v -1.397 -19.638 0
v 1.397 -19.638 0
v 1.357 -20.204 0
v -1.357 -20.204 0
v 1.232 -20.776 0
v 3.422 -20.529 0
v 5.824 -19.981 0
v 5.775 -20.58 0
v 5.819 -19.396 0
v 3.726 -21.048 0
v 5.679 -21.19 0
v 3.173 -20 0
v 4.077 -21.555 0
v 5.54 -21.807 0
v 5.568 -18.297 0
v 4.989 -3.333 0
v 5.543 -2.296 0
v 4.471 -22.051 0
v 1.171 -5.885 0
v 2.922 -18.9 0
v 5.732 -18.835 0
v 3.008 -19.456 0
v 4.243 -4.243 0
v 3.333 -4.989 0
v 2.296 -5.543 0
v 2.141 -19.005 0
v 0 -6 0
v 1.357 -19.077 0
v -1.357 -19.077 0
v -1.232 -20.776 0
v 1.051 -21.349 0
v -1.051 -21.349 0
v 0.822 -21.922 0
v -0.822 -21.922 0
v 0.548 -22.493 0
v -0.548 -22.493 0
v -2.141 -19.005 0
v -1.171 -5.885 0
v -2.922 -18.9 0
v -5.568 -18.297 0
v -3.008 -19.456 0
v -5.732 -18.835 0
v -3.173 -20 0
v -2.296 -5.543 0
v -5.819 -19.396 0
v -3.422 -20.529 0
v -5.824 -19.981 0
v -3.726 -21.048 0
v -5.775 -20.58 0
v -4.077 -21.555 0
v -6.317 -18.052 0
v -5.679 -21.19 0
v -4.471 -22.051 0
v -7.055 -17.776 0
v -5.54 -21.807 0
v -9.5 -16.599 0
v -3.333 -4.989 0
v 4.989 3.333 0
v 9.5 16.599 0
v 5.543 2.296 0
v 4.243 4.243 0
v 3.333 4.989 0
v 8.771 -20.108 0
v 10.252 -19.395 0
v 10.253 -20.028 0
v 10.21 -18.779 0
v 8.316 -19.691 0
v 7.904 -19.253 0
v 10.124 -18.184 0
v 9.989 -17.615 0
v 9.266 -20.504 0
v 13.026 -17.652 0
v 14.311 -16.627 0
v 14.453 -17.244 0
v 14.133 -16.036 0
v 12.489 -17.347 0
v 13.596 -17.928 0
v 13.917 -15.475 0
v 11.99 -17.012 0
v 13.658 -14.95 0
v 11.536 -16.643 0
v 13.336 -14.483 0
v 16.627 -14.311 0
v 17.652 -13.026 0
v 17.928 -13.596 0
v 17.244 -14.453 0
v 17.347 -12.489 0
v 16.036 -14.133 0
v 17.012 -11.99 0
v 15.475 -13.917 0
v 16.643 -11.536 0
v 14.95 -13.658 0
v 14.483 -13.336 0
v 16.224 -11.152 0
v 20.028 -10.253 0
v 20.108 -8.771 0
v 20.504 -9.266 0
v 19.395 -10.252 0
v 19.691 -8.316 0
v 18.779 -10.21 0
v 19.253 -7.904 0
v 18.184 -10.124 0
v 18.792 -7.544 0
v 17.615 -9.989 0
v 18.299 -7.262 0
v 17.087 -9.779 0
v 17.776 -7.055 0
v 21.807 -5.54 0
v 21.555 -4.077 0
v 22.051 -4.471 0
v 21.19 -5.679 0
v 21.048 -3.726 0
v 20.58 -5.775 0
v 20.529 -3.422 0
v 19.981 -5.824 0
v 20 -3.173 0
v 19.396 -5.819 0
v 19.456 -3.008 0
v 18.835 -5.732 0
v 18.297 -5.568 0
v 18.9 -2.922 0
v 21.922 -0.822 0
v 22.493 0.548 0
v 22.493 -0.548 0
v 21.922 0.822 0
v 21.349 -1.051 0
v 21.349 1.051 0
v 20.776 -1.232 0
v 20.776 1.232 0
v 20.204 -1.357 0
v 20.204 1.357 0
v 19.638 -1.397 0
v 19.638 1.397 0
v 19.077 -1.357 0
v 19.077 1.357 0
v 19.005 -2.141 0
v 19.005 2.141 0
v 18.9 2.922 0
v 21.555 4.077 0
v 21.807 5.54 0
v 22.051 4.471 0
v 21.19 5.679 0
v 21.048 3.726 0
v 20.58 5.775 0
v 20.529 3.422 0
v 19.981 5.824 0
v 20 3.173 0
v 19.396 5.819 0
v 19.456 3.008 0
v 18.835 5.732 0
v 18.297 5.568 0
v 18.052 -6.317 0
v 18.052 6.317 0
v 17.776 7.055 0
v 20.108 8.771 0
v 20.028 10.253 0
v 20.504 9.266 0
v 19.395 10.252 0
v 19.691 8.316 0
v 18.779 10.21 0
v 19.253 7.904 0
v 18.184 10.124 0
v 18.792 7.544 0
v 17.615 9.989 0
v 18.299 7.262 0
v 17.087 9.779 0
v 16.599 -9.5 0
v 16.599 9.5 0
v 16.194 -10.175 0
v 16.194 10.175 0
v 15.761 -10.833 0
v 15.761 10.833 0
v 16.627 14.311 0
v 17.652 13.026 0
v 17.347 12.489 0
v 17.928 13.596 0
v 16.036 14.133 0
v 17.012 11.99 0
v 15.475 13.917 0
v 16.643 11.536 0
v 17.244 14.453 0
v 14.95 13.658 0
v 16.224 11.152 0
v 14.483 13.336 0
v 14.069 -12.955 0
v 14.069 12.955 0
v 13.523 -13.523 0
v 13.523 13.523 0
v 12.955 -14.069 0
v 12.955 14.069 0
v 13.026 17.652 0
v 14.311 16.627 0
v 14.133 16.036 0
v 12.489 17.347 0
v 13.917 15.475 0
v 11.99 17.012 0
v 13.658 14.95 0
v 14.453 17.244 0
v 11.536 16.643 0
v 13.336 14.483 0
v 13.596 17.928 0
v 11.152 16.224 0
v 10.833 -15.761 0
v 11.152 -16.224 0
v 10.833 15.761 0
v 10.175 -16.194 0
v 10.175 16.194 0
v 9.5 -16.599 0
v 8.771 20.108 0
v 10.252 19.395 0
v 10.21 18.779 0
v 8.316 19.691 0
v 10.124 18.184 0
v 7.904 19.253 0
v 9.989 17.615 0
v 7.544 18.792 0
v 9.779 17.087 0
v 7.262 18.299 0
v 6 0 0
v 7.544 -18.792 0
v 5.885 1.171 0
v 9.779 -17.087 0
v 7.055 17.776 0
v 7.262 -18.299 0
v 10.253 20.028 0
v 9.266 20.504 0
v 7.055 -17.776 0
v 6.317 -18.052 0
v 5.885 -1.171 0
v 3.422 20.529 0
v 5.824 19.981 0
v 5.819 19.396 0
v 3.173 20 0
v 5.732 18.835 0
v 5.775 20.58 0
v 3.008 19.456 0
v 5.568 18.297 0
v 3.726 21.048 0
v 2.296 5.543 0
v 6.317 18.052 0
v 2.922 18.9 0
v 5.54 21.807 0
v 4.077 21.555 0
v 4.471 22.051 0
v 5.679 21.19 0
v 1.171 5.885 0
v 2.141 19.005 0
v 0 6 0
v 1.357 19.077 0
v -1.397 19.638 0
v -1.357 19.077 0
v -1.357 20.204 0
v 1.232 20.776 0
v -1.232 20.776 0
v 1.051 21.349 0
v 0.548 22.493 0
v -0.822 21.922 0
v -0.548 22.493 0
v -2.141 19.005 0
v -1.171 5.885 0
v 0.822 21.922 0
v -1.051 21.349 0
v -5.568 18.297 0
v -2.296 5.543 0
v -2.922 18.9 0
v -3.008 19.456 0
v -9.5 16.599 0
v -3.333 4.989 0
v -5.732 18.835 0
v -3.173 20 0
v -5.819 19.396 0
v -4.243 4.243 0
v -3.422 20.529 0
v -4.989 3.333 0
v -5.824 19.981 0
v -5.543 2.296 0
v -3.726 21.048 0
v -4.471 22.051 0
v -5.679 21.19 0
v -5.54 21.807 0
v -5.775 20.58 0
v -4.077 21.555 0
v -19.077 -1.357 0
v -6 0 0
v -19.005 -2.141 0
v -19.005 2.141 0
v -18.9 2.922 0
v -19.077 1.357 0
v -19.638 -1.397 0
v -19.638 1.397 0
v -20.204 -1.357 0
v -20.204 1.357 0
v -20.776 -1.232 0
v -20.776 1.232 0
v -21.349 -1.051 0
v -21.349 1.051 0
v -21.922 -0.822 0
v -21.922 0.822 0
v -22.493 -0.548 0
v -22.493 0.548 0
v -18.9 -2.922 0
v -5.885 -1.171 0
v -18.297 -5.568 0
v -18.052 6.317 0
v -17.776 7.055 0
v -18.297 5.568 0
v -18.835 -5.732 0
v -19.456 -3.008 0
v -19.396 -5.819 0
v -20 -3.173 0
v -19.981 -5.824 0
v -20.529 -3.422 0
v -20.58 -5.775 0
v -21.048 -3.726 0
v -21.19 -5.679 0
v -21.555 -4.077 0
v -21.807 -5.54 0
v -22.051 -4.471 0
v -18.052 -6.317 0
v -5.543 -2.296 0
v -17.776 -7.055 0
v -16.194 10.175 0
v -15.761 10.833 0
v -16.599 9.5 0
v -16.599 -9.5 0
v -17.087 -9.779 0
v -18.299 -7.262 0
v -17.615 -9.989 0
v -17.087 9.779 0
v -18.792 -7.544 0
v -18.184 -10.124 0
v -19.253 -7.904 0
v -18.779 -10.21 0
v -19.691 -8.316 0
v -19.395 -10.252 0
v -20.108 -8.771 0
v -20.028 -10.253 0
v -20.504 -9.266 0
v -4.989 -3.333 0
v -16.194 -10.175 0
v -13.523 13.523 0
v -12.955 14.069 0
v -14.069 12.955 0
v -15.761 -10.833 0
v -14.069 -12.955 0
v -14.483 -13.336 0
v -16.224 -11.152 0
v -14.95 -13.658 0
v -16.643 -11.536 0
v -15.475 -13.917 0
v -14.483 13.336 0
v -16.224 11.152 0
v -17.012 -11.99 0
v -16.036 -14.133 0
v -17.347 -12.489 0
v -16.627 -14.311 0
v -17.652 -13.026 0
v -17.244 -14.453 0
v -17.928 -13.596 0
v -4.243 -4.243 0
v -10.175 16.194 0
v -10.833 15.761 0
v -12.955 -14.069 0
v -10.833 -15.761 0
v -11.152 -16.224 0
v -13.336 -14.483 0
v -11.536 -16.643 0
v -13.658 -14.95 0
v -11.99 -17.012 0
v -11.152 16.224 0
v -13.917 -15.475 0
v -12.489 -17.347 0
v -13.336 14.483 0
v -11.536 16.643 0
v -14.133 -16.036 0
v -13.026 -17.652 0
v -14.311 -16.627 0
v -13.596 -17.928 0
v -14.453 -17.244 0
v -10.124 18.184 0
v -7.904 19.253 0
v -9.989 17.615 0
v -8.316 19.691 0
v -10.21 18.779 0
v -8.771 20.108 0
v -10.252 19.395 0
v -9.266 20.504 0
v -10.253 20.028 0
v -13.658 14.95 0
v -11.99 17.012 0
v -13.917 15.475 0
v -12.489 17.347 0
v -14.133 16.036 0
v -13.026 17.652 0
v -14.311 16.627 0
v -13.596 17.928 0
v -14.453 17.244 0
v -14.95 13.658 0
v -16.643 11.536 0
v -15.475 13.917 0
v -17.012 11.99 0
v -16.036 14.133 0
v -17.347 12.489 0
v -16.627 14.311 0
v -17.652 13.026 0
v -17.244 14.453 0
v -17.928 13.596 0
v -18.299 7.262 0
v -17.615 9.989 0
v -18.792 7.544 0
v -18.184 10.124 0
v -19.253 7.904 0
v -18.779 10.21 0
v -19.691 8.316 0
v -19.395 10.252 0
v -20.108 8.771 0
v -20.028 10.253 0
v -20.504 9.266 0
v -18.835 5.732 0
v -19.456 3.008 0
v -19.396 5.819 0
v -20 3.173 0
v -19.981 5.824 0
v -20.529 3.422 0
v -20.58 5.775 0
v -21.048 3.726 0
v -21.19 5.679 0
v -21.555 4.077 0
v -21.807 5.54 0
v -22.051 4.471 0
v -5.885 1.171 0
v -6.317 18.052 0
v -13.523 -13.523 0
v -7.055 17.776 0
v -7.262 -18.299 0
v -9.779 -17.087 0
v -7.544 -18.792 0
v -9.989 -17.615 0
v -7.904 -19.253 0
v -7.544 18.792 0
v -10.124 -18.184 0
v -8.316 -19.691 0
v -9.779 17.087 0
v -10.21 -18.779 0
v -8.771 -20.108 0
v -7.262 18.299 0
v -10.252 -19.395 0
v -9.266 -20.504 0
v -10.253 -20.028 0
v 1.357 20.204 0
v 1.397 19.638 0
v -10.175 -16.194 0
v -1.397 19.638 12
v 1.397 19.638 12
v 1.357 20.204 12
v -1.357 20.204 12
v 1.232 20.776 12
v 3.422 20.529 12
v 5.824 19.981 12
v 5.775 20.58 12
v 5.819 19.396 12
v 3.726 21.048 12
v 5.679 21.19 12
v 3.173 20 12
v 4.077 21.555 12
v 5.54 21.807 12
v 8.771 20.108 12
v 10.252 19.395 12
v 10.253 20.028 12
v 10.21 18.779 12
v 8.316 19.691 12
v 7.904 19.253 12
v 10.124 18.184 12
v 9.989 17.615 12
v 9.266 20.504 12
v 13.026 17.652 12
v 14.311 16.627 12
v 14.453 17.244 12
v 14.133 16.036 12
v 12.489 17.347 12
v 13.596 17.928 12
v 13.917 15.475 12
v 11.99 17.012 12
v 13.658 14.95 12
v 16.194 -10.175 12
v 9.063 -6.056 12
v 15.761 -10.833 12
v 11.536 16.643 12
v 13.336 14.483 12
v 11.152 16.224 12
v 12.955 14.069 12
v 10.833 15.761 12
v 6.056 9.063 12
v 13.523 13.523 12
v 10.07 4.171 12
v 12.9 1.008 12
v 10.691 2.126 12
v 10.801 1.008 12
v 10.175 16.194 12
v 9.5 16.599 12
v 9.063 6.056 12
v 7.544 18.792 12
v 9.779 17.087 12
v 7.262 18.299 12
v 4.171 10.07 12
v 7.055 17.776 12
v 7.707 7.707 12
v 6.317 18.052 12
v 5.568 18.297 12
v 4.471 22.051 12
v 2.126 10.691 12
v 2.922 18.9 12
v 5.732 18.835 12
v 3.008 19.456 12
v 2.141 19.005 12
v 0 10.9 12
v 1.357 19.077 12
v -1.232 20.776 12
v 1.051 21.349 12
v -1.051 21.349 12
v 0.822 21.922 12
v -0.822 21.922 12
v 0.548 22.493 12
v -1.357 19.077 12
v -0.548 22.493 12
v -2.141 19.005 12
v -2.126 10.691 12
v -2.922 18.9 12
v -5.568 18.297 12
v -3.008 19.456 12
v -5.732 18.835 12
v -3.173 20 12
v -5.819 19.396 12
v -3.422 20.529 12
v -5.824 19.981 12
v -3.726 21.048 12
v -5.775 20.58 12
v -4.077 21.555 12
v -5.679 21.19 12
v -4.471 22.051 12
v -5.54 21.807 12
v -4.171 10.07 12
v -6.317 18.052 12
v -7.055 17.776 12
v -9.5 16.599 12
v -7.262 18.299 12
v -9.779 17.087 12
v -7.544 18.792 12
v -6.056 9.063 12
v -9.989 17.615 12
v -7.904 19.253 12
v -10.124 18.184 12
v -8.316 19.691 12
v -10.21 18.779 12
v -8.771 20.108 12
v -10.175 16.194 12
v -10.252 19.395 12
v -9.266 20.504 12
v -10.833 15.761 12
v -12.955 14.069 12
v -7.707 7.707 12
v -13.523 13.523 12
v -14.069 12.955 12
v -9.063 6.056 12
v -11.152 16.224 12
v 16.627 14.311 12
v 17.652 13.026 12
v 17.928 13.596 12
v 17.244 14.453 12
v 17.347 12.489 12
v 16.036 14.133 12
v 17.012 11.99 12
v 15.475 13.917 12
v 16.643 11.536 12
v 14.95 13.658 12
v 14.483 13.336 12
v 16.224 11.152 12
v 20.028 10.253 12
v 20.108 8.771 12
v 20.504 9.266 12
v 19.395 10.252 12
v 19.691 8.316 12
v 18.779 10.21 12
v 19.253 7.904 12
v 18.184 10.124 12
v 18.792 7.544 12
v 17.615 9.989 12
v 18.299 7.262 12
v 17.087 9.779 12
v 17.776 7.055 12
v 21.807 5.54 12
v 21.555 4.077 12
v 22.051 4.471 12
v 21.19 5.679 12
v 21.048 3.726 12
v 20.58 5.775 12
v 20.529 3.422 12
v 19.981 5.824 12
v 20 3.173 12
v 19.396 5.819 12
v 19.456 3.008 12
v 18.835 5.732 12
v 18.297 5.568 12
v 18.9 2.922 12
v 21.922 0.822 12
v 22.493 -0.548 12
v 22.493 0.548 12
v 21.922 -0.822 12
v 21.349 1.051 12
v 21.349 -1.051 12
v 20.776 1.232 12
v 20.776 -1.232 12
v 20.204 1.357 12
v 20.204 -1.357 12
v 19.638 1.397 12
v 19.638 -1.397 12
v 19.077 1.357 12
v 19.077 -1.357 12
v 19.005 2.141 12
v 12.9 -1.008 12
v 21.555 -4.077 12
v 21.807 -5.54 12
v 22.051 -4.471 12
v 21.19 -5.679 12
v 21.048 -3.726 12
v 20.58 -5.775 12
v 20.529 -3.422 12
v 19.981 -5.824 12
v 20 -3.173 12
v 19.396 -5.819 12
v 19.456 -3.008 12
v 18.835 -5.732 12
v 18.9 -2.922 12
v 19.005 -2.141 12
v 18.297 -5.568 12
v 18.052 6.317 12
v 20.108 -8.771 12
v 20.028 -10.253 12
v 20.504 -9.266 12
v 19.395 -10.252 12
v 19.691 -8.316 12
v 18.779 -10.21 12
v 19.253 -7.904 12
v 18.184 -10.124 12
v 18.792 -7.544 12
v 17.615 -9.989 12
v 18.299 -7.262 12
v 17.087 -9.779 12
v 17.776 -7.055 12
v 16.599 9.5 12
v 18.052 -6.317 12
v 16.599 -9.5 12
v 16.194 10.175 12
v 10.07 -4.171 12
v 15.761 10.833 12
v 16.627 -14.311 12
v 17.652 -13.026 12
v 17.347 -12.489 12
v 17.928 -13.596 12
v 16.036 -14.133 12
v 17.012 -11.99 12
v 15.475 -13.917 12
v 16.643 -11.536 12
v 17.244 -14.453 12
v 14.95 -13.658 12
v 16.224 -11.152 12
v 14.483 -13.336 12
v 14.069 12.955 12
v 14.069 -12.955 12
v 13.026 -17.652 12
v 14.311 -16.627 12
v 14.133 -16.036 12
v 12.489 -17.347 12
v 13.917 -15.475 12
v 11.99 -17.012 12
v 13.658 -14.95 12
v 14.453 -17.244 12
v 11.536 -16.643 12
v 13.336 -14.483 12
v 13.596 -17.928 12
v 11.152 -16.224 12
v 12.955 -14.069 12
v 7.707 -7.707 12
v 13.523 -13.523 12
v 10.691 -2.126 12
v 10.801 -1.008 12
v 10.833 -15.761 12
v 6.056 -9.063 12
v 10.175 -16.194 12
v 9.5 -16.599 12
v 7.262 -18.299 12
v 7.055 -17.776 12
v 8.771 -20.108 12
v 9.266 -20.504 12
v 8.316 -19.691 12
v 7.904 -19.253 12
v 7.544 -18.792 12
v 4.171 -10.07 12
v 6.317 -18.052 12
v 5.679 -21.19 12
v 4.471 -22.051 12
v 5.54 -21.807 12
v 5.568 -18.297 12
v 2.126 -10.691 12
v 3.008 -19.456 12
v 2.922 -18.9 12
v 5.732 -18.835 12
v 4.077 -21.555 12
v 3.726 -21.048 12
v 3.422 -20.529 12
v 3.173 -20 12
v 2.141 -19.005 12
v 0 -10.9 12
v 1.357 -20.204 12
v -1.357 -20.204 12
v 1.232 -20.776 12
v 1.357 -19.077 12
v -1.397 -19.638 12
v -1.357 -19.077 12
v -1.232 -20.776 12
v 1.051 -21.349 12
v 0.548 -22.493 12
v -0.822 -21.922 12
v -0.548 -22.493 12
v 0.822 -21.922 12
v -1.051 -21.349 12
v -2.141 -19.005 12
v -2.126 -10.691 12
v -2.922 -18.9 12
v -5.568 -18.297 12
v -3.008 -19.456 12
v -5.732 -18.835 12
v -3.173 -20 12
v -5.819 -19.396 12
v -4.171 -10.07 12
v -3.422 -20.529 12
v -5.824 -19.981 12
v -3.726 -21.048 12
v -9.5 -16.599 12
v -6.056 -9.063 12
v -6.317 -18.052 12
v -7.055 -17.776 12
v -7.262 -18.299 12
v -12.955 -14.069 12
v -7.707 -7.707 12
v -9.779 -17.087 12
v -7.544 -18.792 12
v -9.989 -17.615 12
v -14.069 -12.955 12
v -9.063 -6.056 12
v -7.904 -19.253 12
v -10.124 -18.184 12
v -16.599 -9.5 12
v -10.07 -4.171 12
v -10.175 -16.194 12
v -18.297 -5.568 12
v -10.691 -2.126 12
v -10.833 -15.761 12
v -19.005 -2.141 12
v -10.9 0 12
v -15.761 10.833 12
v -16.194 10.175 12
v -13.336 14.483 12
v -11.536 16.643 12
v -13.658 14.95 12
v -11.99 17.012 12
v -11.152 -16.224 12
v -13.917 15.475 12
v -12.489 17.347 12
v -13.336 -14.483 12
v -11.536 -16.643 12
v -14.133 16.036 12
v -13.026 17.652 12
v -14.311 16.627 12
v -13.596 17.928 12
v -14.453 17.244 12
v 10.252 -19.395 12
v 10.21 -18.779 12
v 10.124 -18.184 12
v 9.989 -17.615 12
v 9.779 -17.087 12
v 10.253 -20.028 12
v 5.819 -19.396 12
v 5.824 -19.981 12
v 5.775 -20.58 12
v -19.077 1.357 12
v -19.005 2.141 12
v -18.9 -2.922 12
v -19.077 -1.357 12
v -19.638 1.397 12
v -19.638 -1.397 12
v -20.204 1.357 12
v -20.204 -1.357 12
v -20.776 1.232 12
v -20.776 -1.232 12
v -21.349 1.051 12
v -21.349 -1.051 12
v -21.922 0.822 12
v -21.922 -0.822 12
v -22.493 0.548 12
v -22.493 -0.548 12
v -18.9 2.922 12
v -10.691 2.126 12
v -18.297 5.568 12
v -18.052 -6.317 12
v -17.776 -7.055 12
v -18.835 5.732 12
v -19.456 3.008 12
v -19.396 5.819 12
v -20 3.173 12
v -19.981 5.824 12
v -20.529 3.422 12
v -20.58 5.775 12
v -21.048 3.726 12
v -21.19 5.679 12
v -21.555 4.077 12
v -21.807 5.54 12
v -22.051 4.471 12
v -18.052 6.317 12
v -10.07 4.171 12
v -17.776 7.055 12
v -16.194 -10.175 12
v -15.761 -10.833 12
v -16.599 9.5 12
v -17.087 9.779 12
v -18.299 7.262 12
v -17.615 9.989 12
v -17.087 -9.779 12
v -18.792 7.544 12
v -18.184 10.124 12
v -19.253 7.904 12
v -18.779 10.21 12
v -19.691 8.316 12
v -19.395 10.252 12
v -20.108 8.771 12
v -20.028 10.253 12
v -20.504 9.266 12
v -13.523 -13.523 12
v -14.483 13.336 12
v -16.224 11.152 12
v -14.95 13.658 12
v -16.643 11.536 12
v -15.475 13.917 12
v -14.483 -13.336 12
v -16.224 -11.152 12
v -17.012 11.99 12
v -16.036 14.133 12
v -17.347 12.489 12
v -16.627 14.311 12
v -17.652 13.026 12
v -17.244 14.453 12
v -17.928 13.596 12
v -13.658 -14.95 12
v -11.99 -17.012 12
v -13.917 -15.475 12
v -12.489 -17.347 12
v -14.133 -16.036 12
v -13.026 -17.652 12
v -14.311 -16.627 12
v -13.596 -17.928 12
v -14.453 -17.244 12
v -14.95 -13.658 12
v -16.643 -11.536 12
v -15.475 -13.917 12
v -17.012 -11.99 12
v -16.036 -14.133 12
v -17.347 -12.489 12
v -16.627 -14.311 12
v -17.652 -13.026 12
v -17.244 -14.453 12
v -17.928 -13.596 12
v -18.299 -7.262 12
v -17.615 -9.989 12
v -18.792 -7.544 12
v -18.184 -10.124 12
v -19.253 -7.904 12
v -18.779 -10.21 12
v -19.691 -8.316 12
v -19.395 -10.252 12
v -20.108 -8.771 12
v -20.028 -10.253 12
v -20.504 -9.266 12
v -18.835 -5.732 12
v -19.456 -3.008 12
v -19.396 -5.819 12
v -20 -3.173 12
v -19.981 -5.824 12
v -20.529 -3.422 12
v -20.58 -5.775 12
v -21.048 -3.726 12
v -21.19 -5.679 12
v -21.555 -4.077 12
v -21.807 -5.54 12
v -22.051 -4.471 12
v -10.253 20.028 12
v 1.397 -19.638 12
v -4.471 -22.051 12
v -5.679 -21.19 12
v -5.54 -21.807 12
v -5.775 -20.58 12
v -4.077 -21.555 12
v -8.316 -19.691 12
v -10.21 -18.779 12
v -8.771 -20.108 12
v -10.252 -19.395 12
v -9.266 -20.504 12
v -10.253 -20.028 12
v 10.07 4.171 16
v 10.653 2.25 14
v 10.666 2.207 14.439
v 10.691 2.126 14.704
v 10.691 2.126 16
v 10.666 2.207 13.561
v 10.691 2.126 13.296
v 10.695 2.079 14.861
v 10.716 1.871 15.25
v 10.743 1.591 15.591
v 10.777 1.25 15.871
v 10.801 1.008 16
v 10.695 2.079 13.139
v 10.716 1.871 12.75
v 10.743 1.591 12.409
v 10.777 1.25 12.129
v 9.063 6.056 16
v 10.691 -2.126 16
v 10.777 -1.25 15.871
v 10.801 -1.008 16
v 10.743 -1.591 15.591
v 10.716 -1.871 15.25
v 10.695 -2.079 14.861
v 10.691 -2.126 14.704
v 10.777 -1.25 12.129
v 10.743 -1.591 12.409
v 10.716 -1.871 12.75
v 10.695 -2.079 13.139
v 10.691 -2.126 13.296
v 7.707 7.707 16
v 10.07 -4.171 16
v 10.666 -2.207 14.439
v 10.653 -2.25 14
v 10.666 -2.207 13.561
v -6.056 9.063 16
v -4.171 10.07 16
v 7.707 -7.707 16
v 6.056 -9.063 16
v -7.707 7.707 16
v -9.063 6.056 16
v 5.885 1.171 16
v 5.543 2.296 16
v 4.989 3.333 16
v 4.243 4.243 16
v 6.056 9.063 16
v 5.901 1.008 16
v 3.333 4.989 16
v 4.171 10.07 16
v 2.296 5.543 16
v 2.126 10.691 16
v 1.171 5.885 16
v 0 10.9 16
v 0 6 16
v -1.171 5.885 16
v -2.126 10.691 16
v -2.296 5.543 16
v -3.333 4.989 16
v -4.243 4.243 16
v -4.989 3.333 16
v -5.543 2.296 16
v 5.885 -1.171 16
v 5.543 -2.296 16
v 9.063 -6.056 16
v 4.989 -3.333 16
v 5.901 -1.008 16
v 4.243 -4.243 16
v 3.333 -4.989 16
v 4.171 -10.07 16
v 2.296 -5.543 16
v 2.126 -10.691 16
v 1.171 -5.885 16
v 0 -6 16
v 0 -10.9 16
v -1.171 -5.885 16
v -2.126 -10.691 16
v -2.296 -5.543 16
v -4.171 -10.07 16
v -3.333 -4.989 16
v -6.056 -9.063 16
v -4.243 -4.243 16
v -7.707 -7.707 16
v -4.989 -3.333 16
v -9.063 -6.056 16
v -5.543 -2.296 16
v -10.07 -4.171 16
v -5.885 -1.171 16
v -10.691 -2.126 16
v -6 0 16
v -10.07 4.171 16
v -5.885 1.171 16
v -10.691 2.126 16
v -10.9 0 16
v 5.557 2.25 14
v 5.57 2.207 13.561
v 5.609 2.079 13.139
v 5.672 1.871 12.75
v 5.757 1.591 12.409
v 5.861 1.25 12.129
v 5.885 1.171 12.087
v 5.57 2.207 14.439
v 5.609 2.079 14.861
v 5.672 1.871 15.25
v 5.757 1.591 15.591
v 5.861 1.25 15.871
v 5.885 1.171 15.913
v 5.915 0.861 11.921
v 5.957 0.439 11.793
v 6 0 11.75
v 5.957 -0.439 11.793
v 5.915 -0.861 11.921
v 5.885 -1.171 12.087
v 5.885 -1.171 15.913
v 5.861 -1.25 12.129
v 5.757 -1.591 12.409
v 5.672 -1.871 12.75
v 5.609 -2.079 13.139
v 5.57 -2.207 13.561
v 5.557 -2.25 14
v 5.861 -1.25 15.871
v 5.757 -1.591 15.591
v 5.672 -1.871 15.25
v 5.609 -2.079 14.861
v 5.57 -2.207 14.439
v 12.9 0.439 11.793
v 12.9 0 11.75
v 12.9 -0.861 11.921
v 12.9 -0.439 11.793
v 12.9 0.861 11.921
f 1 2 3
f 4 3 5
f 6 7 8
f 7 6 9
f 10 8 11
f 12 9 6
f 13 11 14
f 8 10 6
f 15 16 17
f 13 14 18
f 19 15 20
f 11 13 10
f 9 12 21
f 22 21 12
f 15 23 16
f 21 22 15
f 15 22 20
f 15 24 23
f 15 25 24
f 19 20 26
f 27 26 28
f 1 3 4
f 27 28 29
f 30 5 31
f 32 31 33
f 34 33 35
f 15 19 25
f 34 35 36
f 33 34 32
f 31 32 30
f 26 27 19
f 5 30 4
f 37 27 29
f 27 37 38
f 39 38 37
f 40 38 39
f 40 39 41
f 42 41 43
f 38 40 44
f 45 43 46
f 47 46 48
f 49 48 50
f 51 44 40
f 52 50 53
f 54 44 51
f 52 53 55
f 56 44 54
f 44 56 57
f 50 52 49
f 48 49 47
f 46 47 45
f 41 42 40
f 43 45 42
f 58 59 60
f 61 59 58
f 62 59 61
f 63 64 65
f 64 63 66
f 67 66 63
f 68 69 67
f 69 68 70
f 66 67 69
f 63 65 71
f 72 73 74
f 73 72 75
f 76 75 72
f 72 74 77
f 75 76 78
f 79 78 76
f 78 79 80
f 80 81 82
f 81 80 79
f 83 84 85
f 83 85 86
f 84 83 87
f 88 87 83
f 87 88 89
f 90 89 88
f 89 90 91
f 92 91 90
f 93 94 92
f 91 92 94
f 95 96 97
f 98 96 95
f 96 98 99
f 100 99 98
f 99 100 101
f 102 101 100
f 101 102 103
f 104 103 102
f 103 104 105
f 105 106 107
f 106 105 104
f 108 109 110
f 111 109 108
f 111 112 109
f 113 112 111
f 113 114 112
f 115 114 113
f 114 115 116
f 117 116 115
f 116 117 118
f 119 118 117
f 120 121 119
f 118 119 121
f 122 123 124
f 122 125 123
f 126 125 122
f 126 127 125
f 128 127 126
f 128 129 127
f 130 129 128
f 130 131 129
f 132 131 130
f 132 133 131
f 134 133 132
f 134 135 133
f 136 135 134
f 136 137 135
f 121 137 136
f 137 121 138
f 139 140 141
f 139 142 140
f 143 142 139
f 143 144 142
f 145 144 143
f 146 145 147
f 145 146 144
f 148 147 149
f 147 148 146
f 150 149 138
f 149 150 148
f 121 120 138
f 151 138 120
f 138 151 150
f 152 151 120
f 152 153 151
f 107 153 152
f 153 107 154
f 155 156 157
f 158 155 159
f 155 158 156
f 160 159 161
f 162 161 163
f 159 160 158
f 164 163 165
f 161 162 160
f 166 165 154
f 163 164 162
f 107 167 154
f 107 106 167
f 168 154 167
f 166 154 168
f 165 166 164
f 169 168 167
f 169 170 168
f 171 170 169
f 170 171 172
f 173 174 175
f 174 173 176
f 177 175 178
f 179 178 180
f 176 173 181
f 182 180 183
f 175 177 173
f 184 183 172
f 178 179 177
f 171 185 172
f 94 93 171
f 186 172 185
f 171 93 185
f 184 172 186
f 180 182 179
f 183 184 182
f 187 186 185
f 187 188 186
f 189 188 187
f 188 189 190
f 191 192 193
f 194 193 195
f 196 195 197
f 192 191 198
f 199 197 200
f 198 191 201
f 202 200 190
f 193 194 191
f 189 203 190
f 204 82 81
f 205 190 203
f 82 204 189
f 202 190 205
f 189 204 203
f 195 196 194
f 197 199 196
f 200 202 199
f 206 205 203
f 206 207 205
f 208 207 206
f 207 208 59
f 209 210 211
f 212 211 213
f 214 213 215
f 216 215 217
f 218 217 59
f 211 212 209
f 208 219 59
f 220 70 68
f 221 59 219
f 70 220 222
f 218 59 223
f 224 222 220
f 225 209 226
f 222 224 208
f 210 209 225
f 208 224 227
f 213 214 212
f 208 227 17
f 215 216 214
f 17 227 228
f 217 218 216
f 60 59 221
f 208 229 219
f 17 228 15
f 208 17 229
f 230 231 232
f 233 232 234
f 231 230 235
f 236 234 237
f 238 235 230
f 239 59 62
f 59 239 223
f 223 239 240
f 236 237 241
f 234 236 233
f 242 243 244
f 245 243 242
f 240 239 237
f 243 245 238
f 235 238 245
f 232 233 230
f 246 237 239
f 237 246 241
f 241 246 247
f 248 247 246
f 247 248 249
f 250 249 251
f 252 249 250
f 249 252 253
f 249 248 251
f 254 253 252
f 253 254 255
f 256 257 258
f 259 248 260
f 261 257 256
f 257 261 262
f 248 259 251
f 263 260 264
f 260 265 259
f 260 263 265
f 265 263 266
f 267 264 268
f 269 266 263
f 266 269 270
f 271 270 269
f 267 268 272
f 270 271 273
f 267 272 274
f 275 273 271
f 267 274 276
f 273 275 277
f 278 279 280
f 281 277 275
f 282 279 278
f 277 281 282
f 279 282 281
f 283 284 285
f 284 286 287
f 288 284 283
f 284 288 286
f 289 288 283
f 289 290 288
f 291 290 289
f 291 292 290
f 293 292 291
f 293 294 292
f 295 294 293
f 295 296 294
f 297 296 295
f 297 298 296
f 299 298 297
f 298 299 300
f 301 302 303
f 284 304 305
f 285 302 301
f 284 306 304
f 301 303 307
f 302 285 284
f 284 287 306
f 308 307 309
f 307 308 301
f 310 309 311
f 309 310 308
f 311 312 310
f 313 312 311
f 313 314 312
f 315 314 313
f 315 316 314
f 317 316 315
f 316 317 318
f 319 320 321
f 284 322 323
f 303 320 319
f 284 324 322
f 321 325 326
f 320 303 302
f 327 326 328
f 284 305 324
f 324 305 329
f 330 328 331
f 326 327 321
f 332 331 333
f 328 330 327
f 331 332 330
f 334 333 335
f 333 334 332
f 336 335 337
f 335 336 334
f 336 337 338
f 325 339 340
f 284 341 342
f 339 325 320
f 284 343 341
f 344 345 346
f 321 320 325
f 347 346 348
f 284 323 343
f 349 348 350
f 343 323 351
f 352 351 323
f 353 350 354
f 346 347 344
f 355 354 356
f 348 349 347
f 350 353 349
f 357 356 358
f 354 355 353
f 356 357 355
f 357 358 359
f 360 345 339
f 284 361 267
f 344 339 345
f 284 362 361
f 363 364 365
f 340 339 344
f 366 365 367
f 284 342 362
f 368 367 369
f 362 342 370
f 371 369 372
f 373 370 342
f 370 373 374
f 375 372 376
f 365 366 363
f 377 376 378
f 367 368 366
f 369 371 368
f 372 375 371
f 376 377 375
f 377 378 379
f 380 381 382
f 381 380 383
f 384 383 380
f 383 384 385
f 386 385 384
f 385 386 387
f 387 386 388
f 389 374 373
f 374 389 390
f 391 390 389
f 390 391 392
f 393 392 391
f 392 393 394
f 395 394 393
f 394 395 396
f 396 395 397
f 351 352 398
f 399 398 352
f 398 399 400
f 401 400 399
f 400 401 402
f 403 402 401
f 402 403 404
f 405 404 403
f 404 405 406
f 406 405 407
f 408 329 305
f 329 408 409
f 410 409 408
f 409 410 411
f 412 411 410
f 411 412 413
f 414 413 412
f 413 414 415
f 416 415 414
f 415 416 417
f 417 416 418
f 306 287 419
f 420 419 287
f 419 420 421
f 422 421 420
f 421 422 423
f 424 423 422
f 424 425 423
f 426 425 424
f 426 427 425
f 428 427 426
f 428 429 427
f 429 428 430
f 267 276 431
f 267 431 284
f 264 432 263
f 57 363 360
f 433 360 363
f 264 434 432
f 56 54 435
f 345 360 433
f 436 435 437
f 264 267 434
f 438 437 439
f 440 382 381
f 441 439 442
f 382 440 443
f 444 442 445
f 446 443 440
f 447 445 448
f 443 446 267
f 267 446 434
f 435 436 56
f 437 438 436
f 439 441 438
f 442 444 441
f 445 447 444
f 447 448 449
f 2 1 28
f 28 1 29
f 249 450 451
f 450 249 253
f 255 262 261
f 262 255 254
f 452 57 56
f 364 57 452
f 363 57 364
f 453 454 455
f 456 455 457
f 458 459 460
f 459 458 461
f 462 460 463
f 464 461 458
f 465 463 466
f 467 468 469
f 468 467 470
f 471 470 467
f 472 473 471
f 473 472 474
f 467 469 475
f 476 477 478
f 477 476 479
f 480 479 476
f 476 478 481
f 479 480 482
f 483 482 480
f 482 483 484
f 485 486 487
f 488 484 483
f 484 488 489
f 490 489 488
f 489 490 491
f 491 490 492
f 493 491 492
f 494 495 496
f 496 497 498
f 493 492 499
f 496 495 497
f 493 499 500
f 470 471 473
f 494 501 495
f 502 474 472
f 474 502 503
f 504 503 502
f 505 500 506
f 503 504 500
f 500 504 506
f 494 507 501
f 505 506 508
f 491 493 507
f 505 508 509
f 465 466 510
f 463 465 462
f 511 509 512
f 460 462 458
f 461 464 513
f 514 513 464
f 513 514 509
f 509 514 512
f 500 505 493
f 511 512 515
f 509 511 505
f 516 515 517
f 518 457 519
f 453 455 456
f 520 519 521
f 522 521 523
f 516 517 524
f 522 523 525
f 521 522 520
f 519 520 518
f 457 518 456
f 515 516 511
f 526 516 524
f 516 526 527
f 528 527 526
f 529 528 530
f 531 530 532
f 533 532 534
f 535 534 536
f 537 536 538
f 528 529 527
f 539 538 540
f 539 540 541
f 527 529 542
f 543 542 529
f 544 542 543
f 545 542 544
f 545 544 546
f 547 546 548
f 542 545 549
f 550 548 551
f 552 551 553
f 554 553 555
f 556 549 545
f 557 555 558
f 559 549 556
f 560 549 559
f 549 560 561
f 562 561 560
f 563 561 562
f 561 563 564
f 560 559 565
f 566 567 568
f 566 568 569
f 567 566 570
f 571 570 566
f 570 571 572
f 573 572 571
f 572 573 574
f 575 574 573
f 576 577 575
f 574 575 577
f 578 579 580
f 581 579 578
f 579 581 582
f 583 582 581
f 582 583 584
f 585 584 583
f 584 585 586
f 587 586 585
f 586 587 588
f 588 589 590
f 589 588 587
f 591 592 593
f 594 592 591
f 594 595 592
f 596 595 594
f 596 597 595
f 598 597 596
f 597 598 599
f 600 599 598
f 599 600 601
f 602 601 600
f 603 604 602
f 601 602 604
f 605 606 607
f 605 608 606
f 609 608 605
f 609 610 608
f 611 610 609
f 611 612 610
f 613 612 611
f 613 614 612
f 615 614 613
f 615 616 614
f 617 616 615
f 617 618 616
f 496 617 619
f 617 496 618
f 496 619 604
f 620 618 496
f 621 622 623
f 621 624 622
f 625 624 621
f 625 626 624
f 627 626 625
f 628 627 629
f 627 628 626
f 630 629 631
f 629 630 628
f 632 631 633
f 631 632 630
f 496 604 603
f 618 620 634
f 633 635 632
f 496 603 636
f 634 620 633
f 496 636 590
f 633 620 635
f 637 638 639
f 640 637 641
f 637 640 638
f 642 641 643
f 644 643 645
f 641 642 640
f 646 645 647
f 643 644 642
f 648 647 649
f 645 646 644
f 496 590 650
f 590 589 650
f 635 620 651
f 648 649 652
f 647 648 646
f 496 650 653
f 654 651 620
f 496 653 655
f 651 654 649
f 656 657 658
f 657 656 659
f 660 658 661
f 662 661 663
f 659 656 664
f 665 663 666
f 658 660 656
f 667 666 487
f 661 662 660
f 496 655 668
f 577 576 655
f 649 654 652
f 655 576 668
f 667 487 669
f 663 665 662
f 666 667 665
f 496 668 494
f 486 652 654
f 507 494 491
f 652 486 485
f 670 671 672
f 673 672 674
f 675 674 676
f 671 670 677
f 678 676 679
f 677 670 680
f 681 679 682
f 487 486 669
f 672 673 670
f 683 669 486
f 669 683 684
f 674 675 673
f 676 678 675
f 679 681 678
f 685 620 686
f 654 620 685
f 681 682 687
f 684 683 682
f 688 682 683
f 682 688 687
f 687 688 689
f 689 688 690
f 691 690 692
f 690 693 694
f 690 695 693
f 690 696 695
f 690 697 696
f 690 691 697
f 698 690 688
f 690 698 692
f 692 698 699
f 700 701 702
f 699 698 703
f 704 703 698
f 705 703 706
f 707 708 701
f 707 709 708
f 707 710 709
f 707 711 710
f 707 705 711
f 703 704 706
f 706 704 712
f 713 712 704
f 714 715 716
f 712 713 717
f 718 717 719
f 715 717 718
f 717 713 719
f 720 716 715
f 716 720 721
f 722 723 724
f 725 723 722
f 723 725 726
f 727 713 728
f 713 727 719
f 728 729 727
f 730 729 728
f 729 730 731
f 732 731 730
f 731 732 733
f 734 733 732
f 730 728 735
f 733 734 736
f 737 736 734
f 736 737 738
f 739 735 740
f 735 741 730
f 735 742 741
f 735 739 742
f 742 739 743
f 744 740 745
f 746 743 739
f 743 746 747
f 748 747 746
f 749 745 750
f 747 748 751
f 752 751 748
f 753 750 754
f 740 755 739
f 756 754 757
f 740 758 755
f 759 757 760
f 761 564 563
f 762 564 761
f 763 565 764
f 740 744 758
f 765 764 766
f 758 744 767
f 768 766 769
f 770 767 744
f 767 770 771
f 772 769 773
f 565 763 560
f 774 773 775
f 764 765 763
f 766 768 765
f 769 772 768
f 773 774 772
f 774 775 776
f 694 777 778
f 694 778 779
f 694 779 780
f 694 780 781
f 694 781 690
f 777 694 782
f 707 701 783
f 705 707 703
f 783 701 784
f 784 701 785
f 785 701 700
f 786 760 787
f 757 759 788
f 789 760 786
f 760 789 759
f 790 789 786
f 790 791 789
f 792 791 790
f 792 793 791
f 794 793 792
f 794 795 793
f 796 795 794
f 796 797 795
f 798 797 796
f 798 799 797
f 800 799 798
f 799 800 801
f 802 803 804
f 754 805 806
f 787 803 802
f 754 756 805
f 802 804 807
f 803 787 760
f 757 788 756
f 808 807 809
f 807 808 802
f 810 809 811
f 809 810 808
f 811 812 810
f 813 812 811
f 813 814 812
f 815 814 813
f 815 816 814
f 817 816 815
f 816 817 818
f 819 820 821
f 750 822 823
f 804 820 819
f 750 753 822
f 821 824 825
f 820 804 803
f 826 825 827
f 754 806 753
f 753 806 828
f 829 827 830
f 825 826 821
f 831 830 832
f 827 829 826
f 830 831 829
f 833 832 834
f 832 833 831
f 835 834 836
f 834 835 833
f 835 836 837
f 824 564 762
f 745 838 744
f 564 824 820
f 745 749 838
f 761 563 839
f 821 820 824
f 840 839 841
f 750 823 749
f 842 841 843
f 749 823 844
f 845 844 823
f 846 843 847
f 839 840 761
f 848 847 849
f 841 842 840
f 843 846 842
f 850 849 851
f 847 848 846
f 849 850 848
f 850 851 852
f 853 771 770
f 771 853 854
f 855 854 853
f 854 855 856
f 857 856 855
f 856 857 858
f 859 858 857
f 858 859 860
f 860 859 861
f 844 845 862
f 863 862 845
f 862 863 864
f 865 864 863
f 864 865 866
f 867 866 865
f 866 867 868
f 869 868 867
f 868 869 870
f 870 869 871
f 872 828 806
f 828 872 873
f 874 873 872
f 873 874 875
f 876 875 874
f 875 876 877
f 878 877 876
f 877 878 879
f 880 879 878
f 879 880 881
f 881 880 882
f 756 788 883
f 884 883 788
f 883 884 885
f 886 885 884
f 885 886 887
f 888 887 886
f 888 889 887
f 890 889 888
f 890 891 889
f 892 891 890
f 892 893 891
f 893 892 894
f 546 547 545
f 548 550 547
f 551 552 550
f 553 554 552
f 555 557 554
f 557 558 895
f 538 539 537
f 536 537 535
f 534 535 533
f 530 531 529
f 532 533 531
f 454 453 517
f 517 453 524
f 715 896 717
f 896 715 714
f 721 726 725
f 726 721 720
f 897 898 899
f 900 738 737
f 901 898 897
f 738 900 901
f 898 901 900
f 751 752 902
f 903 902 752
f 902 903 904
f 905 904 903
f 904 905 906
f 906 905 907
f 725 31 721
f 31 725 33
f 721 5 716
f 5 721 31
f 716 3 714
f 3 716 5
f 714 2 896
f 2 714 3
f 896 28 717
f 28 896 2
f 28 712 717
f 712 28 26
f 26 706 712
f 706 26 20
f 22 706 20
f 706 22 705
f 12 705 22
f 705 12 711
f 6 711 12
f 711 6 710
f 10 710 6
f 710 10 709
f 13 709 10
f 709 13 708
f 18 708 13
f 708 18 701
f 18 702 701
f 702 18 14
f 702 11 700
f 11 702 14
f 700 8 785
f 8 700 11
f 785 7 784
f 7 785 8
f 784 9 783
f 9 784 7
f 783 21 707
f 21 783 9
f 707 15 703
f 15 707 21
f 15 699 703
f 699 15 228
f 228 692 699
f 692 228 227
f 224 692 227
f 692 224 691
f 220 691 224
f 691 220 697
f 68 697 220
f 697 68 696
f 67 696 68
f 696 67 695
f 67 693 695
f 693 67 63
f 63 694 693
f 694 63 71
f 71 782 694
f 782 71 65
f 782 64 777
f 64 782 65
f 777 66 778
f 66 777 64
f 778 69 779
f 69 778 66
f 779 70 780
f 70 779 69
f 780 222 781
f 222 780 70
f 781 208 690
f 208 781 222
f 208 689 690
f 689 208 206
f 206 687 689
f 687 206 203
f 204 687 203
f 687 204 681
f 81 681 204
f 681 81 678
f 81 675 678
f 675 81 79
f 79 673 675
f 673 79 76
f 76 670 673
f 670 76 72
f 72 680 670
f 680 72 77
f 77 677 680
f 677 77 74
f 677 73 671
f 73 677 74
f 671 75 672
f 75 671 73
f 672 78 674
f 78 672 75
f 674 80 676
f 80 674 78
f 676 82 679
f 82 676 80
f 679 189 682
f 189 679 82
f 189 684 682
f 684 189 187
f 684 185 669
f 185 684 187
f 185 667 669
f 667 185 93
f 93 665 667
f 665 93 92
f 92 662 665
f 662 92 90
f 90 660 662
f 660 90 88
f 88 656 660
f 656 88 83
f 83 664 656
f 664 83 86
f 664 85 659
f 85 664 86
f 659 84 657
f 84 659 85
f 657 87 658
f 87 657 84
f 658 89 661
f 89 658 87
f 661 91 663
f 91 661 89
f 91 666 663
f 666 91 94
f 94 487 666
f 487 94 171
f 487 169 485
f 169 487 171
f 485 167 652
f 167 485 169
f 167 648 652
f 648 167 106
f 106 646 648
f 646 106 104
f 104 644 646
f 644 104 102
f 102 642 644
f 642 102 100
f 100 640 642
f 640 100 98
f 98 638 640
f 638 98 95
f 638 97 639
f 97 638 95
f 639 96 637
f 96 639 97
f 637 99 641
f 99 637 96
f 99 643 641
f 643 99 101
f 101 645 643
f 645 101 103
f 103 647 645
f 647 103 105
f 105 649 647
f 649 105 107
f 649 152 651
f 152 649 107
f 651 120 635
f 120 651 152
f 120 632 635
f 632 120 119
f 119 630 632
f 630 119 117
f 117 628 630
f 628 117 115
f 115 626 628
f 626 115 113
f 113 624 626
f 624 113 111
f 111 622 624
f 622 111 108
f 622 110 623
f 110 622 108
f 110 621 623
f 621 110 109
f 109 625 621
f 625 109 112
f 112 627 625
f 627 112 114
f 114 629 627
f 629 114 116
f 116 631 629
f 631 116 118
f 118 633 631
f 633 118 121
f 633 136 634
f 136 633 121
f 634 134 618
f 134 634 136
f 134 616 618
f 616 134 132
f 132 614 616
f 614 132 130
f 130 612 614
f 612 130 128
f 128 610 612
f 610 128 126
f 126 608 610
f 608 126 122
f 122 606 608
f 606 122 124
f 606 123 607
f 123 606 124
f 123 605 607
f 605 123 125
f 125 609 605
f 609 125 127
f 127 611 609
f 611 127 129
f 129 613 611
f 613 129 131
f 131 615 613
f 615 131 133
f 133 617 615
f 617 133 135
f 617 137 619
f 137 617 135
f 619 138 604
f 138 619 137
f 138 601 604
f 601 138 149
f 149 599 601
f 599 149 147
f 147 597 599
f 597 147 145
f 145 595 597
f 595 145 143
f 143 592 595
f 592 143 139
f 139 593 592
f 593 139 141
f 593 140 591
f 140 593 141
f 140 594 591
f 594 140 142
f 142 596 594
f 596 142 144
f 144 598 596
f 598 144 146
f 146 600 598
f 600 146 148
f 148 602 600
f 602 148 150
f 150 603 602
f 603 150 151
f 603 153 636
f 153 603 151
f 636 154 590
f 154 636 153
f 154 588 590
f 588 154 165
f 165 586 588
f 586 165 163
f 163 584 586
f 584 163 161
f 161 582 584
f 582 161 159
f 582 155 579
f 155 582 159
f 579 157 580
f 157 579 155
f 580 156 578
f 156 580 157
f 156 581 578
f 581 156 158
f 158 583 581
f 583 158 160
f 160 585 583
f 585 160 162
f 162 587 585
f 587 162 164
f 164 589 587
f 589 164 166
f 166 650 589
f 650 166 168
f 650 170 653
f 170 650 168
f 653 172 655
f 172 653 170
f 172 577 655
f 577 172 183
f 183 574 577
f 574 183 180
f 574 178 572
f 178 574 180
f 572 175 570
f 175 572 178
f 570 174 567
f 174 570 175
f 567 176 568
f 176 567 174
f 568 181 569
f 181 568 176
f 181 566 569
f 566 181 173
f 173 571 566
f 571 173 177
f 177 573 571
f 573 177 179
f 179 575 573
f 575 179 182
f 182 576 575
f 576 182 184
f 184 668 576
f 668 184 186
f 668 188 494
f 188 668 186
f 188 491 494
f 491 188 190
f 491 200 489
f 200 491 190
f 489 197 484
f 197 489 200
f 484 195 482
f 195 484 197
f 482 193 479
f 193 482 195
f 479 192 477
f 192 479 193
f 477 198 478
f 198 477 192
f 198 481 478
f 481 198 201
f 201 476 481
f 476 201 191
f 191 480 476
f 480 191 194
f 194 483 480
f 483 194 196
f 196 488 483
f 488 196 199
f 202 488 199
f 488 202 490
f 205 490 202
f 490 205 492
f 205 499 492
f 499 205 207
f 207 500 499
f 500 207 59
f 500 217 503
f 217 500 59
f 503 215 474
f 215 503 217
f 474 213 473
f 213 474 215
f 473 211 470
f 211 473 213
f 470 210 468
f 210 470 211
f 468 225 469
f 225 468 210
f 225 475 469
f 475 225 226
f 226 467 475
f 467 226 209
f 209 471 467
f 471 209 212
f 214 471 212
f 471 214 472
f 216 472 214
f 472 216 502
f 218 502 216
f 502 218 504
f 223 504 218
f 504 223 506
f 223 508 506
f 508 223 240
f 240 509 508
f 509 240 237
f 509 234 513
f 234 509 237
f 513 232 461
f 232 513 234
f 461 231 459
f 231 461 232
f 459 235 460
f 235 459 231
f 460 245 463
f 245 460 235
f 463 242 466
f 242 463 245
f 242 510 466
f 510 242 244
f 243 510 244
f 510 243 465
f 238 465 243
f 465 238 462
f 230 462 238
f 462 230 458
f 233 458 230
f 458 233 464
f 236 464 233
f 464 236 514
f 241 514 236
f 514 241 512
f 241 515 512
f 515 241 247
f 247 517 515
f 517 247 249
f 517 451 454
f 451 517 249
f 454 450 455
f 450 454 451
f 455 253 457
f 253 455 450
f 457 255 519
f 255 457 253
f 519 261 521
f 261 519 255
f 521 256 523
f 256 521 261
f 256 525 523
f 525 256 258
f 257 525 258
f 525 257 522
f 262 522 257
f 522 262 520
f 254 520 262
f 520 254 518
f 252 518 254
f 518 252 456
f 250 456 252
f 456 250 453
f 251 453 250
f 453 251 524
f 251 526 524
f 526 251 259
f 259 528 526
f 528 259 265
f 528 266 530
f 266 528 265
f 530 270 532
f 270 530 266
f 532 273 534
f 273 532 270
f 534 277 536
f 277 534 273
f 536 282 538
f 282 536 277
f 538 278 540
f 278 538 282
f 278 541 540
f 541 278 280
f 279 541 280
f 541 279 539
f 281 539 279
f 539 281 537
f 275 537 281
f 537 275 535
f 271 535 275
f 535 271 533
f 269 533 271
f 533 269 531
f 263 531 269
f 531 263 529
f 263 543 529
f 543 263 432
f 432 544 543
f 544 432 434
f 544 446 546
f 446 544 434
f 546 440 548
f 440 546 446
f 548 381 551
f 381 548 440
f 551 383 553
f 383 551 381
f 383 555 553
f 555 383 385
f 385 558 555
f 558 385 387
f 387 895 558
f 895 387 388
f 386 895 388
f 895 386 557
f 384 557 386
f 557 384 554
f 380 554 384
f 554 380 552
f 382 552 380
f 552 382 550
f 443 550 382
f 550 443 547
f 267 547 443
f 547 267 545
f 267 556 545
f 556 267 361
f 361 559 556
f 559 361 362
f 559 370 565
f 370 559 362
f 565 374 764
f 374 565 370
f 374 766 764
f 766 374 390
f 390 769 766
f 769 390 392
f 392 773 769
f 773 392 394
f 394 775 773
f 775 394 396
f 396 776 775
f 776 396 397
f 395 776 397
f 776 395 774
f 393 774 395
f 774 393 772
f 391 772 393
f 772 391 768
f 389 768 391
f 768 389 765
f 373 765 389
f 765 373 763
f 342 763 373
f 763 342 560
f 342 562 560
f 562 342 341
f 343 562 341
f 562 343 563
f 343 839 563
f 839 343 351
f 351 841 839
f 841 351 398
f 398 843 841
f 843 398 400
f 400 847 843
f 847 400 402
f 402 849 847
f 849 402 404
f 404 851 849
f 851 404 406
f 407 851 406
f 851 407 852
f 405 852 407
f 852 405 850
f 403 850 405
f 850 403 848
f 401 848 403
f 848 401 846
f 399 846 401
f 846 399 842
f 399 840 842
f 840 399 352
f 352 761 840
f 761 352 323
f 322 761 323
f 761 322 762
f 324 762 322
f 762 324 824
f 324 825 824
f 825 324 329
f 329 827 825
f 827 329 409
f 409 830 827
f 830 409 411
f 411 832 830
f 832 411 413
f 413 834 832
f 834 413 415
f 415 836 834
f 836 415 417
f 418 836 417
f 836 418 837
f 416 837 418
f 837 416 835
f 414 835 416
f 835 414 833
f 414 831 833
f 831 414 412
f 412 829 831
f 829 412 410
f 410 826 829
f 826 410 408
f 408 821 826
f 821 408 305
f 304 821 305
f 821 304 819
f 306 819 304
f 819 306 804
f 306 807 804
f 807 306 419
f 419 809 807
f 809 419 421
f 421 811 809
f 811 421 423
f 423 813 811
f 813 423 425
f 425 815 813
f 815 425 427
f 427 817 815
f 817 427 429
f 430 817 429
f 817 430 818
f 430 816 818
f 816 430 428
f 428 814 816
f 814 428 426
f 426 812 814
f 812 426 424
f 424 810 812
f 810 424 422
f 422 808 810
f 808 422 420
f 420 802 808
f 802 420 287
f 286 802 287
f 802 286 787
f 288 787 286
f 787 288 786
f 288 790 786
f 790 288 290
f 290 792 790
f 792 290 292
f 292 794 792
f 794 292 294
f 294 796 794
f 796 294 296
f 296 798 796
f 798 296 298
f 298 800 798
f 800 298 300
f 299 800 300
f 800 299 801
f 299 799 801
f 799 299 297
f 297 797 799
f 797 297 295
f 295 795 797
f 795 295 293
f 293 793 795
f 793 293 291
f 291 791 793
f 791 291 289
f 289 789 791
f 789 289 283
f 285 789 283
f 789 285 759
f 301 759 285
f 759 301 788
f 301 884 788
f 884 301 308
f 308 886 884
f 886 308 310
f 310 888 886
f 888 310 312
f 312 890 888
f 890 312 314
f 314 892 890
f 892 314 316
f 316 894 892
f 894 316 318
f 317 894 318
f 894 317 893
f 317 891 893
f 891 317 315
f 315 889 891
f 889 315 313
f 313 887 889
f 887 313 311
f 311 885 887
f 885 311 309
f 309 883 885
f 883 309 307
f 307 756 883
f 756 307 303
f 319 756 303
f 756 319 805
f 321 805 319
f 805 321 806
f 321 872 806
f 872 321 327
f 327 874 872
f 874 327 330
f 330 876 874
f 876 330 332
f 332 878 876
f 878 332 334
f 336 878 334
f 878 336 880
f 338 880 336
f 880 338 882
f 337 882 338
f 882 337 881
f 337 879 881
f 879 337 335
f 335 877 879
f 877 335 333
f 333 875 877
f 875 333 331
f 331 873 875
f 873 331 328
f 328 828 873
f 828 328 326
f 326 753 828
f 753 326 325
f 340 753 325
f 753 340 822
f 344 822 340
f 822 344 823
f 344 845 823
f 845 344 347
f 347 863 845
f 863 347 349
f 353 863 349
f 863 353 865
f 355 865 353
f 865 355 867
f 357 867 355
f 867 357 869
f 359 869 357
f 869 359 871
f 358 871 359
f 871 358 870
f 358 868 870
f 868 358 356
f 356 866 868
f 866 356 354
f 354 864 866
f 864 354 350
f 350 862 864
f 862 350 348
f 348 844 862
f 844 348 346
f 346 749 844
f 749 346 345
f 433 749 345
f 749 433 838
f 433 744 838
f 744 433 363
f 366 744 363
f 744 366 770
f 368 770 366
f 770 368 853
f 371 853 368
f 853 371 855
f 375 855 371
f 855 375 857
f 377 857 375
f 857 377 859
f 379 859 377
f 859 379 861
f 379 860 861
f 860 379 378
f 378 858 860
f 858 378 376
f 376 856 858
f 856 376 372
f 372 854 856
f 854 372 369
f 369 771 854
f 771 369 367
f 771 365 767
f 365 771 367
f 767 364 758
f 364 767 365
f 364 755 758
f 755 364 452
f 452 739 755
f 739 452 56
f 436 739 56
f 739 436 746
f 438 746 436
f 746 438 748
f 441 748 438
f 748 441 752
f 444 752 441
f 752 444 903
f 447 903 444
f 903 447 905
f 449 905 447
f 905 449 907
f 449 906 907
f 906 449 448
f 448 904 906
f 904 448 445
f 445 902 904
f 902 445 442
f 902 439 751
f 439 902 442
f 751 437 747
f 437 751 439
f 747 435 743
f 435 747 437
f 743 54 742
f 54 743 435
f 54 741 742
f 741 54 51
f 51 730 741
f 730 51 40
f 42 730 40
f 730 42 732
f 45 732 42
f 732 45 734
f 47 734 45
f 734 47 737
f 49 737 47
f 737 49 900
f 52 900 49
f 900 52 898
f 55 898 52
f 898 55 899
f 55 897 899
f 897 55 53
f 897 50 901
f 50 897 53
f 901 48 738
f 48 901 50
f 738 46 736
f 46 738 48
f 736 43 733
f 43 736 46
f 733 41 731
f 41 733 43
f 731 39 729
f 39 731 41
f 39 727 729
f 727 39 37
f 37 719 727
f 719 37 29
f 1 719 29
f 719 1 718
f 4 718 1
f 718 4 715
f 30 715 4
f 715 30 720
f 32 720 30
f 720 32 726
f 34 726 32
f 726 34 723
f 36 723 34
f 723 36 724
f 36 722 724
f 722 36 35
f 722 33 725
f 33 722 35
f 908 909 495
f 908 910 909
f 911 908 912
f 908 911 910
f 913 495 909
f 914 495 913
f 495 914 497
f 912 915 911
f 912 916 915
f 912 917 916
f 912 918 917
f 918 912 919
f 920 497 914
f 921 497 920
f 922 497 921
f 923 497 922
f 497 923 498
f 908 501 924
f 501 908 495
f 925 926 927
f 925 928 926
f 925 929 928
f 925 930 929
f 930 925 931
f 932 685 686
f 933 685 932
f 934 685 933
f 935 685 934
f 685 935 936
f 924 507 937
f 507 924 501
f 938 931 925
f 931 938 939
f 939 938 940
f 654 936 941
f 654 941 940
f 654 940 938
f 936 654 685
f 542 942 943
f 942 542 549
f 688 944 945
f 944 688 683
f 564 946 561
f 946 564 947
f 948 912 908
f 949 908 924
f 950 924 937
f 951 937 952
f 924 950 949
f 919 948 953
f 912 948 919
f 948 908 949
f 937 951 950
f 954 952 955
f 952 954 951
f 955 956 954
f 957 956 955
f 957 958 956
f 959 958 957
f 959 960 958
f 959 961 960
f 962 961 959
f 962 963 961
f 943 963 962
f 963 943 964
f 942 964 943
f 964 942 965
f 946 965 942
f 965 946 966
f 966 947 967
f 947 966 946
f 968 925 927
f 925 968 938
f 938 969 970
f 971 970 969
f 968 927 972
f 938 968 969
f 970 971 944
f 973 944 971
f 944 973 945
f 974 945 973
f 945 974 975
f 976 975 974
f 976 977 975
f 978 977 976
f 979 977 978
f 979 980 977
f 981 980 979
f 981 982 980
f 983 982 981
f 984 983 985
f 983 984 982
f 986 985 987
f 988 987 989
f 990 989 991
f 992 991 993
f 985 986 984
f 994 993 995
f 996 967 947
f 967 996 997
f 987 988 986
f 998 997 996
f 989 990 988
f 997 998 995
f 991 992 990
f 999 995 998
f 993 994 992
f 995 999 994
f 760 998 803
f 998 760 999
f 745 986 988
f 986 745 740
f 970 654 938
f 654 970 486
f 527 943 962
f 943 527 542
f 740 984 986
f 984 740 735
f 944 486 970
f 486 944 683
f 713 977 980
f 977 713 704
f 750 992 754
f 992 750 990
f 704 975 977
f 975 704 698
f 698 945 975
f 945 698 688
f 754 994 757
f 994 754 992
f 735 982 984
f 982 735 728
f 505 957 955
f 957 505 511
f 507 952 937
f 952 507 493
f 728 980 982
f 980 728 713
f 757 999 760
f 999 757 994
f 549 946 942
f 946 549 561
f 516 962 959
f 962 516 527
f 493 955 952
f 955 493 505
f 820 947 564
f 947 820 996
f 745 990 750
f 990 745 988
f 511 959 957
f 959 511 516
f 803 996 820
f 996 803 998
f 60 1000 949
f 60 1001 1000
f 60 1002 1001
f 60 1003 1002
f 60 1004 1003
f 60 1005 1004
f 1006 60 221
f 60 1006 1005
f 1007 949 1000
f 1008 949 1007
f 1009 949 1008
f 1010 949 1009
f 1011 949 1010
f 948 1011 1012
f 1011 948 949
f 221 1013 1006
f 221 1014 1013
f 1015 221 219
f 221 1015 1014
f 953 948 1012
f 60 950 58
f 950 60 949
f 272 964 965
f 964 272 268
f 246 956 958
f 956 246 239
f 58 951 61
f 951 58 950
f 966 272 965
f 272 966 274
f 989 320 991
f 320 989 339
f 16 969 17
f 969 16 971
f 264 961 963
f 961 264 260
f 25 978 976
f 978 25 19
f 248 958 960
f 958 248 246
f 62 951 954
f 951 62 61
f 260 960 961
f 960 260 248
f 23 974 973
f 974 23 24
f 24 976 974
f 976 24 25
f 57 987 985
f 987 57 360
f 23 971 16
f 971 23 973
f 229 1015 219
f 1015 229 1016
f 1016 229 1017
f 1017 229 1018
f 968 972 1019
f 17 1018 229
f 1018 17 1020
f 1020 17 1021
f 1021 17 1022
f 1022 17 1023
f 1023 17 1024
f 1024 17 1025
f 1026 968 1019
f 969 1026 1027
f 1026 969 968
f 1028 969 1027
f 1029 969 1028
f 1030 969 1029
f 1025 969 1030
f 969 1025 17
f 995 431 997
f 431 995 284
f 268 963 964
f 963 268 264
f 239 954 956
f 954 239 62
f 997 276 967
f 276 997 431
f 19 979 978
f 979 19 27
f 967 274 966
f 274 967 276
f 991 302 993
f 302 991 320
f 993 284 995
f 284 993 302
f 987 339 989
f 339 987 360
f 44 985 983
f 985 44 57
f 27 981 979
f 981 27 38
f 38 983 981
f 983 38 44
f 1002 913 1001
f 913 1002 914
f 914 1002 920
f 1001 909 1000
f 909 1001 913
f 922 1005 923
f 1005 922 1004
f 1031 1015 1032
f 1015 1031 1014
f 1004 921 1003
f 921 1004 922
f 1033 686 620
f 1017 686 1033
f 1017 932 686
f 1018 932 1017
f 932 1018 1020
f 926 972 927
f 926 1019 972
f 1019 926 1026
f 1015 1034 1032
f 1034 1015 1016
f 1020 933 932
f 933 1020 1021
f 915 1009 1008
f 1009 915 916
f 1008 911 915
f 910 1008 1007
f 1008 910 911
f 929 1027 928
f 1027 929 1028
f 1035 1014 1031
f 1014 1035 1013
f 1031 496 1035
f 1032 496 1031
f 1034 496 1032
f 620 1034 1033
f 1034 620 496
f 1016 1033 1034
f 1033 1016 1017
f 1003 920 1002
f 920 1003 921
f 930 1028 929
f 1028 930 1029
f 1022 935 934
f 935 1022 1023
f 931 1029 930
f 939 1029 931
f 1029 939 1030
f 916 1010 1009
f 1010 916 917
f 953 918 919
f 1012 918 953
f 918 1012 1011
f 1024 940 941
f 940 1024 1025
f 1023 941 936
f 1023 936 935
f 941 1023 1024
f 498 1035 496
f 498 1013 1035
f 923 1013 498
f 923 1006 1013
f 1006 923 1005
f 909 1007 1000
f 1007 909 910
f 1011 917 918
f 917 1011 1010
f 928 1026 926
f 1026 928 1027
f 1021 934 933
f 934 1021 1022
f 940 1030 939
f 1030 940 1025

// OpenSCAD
$fn = 32;

// ----------------------------------------------------------------------
// Spur gear: m=1.5 z=28, 45 mm tip diameter x 16 mm
// ----------------------------------------------------------------------

// --- parameters (mm) ---
gear_module = 1.5;        // module
tooth_count = 28;         // number of teeth
gear_w = 12;              // face width
pa = 20;                  // pressure angle, deg
bore = 12;                // shaft bore
hub_dia = 21.8;           // hub diameter
hub_len = 4;              // hub above the face
set_d = 4.5;              // set screw tap hole
set_z = 14;               // set screw height

/* --- involute profile --- */
pitch_r = gear_module * tooth_count / 2;
base_r = pitch_r * cos(pa);
tip_r = pitch_r + gear_module;
root_r = pitch_r - 1.25 * gear_module;
flank_steps = 6;

function inv_deg(a) = (tan(a) - a * PI / 180) * 180 / PI;
function flank_r(i) = root_r + (tip_r - root_r) * i / flank_steps;
function half_angle(r) = 90 / tooth_count + inv_deg(pa) - inv_deg(acos(min(1, base_r / r)));
function tooth_pt(k, i, side) =
    let (r = flank_r(i), a = k * 360 / tooth_count + side * half_angle(r))
    [r * cos(a), r * sin(a)];

module tooth_profile() {
  polygon(points = [
    for (k = [0 : tooth_count - 1])
      each [
        for (i = [0 : flank_steps]) tooth_pt(k, i, -1),
        for (i = [flank_steps : -1 : 0]) tooth_pt(k, i, 1),
        let (ta = (k + 0.5) * 360 / tooth_count)
          [root_r * cos(ta), root_r * sin(ta)]
      ]
  ]);
}

module gear_disc() {
  linear_extrude(height = gear_w) tooth_profile();
}

module hub_boss() {
  translate([0, 0, gear_w - 1]) cylinder(h = hub_len + 1, d = hub_dia);
}

difference() {
  union() {
    gear_disc();
    hub_boss();
  }
  translate([0, 0, -1]) cylinder(h = gear_w + hub_len + 3, d = bore);
  /* set screw, drilled radially */
  translate([-1, 0, set_z]) rotate([0, 90, 0]) cylinder(h = hub_dia / 2 + 3, d = set_d);
}
